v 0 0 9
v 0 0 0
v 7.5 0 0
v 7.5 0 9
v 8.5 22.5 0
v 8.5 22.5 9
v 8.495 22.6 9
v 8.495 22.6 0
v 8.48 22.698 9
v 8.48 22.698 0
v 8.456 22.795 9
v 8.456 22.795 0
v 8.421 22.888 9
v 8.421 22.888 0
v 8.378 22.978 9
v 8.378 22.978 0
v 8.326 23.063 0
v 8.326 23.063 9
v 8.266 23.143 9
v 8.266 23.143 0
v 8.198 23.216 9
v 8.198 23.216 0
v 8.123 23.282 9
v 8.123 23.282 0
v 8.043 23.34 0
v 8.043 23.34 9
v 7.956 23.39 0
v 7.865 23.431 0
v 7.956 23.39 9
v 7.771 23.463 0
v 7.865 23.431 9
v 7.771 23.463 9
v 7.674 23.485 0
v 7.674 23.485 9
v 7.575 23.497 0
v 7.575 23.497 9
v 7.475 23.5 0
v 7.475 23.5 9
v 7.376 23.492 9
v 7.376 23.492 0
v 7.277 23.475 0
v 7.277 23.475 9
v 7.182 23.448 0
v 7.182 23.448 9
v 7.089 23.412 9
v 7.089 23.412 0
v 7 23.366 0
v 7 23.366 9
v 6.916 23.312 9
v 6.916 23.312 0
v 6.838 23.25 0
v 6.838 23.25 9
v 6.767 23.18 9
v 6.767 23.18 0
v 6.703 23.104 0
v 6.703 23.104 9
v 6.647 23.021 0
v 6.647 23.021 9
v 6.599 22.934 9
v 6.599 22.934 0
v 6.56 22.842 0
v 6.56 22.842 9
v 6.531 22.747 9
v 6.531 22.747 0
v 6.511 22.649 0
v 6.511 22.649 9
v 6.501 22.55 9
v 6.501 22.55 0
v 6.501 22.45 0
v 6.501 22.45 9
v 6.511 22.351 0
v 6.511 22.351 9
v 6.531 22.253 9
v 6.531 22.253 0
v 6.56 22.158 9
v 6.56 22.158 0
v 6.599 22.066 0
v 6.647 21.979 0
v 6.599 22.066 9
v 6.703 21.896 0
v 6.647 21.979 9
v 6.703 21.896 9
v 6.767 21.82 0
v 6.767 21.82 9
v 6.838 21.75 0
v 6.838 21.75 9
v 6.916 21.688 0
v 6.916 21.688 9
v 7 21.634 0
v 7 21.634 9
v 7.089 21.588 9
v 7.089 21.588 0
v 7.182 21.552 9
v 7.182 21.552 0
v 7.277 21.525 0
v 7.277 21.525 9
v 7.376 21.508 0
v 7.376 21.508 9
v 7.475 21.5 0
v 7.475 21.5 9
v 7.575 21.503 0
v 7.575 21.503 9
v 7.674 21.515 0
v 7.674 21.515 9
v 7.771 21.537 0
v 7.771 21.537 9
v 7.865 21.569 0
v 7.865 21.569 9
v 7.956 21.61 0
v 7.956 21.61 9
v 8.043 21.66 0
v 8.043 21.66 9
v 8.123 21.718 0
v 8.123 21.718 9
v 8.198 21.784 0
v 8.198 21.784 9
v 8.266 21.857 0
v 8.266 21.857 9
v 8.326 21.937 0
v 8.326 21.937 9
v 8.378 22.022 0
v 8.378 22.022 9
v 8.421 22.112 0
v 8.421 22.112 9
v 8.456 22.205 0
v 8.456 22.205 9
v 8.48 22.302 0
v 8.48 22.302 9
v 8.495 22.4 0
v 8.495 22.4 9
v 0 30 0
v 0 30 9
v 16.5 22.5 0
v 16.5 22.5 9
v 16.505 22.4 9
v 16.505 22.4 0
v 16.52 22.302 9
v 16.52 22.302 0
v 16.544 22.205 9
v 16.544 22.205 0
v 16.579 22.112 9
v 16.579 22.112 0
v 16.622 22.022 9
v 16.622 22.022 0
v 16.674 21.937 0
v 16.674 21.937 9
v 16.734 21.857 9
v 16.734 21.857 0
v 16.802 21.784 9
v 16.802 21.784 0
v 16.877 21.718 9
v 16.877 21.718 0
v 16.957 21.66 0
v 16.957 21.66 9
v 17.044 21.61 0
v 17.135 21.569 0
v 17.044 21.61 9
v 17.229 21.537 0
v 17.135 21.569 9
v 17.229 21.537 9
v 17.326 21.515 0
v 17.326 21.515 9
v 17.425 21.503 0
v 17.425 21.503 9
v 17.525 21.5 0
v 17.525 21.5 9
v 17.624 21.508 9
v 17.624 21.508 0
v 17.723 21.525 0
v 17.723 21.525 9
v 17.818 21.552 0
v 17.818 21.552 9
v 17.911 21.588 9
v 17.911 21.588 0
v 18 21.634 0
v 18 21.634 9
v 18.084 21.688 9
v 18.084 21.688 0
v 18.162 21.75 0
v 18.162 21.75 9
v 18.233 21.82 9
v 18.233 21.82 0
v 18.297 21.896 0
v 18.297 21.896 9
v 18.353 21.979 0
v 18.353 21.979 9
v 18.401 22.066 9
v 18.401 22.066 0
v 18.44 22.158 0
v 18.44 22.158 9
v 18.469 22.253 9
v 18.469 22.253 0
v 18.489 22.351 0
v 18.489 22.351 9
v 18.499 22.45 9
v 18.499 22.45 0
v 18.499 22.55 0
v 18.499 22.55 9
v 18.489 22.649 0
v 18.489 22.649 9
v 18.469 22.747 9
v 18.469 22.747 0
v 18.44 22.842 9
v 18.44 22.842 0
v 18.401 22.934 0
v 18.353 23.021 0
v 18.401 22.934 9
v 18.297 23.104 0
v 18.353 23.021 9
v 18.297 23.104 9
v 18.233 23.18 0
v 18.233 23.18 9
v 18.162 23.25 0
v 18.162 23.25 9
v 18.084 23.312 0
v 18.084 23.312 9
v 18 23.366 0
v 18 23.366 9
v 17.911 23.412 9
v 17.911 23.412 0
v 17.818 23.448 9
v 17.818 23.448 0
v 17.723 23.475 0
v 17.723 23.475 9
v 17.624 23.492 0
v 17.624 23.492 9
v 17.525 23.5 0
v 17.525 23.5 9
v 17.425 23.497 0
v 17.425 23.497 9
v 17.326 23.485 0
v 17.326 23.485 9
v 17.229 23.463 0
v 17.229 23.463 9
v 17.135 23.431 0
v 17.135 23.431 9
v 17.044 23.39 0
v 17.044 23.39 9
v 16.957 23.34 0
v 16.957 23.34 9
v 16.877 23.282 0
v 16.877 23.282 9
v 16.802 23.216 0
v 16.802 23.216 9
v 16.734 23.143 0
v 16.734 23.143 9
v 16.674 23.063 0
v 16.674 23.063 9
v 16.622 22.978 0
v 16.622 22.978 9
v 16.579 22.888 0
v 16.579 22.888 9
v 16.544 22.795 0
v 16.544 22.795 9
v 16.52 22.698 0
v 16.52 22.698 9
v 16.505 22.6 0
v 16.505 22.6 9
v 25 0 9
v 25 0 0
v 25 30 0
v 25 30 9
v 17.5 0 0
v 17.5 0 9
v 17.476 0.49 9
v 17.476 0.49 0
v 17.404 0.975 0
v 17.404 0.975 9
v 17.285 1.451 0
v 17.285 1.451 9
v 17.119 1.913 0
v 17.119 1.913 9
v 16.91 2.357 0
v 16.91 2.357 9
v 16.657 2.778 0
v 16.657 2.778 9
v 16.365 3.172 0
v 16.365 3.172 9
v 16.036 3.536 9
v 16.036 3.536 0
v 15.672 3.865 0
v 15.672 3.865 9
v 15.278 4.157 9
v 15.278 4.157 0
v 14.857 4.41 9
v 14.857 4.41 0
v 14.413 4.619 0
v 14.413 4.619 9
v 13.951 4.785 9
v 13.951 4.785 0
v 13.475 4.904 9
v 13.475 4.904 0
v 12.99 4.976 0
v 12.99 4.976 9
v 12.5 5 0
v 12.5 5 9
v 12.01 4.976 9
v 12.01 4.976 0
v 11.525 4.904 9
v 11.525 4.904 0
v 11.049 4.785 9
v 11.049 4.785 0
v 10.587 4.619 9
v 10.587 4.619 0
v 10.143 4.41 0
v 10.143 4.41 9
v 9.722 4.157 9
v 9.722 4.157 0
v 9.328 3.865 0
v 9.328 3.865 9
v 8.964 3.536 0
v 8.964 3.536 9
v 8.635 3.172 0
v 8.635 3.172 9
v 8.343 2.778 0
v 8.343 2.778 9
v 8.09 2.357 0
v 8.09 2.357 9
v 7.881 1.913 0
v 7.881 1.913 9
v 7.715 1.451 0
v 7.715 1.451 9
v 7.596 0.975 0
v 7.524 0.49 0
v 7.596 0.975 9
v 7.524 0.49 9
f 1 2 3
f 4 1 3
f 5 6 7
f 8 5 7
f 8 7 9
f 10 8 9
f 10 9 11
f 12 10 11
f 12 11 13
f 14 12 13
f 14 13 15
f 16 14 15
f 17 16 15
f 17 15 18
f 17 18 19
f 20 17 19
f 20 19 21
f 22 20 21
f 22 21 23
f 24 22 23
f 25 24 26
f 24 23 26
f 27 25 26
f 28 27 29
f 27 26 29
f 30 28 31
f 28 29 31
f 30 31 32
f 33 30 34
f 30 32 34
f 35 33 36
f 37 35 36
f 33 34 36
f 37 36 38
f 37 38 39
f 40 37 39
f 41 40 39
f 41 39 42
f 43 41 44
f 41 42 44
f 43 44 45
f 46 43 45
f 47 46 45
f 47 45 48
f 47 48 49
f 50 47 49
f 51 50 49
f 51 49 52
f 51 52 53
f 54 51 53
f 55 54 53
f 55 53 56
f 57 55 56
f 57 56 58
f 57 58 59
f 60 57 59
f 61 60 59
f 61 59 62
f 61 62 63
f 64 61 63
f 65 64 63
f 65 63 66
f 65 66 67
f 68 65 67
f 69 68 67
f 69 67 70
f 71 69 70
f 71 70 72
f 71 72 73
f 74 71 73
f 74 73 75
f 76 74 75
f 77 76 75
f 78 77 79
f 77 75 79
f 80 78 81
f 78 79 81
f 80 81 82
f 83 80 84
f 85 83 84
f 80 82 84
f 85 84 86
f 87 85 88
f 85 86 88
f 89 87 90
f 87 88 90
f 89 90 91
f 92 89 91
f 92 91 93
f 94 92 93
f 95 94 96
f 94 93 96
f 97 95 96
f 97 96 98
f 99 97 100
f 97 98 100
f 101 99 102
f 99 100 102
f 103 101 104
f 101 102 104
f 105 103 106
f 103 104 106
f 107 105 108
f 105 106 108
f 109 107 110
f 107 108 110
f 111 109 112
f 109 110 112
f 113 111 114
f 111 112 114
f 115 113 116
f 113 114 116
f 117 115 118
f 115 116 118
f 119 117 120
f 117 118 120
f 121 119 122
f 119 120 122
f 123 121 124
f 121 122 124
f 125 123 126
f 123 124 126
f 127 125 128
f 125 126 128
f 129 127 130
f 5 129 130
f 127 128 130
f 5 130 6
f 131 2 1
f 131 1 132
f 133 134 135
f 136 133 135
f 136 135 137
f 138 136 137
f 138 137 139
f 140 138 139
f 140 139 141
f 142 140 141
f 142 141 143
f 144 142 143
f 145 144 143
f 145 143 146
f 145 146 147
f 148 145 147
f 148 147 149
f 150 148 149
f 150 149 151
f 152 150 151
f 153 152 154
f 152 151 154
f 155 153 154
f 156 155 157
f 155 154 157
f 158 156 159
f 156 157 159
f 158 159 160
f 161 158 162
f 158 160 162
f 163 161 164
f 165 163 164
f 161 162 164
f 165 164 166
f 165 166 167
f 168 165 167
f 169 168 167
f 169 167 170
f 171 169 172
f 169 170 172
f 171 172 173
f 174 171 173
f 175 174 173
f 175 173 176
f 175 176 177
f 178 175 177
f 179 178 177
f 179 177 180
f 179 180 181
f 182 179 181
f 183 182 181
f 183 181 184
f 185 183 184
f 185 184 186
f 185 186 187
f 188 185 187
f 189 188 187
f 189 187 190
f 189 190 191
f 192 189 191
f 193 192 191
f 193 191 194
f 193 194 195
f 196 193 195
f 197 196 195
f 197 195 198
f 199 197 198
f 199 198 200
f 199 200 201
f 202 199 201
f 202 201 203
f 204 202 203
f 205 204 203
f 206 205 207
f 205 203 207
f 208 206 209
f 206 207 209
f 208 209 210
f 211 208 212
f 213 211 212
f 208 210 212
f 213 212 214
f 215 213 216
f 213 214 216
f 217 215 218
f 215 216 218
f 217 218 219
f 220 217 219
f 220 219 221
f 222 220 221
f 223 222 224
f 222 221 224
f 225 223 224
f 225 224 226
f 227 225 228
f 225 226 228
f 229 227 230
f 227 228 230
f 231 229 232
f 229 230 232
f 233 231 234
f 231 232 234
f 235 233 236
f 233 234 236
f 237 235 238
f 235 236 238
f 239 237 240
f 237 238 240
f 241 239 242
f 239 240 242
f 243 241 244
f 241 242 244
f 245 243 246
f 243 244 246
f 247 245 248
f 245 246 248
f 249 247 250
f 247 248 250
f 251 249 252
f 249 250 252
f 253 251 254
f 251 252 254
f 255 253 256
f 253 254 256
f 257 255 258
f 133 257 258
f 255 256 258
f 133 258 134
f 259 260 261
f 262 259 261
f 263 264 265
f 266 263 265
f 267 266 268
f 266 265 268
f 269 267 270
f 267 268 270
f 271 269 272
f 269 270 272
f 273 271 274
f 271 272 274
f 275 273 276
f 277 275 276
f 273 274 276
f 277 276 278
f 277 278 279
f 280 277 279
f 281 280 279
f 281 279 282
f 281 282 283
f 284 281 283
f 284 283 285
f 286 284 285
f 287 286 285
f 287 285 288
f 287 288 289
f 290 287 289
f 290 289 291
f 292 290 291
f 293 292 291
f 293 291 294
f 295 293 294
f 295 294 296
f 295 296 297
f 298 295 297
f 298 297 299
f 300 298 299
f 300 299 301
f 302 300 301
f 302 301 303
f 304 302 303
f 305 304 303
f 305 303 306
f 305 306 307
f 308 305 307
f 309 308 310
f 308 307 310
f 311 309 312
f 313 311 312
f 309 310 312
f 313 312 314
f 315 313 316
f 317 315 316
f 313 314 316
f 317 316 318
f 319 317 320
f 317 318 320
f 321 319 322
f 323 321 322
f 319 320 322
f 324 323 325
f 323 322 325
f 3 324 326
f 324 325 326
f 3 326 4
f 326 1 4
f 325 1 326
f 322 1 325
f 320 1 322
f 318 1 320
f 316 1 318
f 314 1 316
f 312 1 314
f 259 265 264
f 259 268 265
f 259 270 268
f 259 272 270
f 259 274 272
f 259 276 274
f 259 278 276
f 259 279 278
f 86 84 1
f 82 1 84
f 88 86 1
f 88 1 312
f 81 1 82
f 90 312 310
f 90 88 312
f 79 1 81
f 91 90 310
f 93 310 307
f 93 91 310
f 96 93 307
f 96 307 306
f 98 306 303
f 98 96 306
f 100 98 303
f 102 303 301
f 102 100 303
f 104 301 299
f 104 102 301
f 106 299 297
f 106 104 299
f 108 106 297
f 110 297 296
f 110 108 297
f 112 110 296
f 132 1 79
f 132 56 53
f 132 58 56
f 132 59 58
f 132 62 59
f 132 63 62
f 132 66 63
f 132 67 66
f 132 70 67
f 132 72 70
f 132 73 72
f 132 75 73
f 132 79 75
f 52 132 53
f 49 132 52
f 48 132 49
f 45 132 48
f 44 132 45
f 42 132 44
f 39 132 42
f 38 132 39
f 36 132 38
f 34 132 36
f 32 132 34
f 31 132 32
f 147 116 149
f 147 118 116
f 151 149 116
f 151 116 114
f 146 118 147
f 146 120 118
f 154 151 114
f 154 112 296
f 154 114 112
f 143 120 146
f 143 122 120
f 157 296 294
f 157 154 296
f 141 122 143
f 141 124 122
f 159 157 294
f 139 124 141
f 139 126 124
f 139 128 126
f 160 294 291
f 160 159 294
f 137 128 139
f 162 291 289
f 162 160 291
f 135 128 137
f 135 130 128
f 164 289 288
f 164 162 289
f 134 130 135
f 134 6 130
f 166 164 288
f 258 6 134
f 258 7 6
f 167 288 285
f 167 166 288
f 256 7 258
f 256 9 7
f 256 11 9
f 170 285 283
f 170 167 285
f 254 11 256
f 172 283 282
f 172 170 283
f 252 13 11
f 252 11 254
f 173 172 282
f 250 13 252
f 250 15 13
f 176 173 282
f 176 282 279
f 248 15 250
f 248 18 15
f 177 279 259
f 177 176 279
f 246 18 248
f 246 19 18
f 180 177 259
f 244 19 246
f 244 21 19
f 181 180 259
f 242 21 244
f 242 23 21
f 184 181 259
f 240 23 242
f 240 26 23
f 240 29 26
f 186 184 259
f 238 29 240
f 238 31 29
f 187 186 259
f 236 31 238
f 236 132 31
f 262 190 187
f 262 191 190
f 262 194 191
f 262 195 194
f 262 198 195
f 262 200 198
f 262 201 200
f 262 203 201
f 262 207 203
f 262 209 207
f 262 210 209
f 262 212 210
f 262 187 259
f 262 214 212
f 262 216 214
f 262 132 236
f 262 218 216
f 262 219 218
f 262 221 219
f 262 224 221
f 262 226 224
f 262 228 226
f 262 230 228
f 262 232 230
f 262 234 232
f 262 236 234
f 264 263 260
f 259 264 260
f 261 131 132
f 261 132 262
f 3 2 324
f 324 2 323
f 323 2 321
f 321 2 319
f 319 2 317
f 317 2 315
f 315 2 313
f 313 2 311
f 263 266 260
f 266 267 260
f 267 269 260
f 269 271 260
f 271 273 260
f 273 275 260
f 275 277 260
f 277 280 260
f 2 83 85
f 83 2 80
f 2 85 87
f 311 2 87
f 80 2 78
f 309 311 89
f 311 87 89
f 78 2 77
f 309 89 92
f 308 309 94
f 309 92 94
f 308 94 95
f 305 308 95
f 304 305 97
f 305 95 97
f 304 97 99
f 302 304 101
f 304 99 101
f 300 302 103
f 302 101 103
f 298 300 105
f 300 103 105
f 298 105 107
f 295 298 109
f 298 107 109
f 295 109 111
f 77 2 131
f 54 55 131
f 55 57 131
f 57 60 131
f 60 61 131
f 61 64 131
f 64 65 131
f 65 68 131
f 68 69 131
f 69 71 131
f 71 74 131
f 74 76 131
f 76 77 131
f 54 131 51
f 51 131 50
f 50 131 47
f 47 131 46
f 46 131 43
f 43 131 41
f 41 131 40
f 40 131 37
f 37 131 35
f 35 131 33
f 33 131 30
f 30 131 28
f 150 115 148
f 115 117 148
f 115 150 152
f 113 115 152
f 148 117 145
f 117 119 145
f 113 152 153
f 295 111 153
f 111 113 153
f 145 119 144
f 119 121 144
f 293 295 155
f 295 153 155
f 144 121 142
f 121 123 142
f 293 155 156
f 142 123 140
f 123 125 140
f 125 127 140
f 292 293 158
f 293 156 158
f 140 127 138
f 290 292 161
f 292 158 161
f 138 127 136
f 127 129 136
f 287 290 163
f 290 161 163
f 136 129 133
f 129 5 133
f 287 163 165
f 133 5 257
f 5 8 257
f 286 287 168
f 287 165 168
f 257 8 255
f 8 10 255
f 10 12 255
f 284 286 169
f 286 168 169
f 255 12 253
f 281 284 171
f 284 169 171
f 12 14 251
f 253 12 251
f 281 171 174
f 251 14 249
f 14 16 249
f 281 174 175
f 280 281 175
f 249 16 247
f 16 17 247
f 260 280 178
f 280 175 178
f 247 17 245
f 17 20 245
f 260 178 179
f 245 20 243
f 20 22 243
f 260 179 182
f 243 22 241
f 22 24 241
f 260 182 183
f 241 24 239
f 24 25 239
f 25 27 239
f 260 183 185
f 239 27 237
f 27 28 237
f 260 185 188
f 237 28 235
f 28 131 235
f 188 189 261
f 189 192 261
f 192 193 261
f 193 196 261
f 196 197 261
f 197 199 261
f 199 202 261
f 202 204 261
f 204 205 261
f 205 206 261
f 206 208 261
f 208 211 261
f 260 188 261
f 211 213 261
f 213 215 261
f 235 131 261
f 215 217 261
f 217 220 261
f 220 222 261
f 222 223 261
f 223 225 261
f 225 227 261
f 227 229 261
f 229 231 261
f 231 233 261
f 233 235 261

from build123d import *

# Parameters (mm, degrees)
SKETCH1_W           = 25
SKETCH1_H           = 30
BOSS_EXTRUDE1_DEPTH = 9
CUT_EXTRUDE3_DEPTH  = 41.074929819
SKETCH5_R           = 1
CUT_EXTRUDE4_DEPTH  = 41.074929819


with BuildPart() as part:
    # Sketch1 → Boss-Extrude1 (new body)
    with BuildSketch(Plane.XY):
        with Locations((12.5, 15)):
            Rectangle(SKETCH1_W, SKETCH1_H)
    extrude(amount=BOSS_EXTRUDE1_DEPTH)

    # Sketch4 → Cut-Extrude3 (cut, through all)
    with BuildSketch(Plane.XY.offset(9)):
        with BuildLine():
            ThreePointArc((17.5, 0), (12.5, 5), (7.5, 0))
            Line((7.5, 0), (17.5, 0))
        make_face()
        with BuildLine():
            Line((17.5, 0), (7.5, 0))
            ThreePointArc((7.5, 0), (12.5, -5), (17.5, 0))
        make_face()
    extrude(amount=-CUT_EXTRUDE3_DEPTH, mode=Mode.SUBTRACT)

    # Sketch5 → Cut-Extrude4 (cut, through all)
    with BuildSketch(Plane.XY.offset(9)):
        with Locations((7.5, 22.5)):
            Circle(SKETCH5_R)
        with Locations(Location((17.5, 22.5, 0), (0, 0, 180))):
            Circle(SKETCH5_R)
    extrude(amount=-CUT_EXTRUDE4_DEPTH, mode=Mode.SUBTRACT)


solid = part.part
